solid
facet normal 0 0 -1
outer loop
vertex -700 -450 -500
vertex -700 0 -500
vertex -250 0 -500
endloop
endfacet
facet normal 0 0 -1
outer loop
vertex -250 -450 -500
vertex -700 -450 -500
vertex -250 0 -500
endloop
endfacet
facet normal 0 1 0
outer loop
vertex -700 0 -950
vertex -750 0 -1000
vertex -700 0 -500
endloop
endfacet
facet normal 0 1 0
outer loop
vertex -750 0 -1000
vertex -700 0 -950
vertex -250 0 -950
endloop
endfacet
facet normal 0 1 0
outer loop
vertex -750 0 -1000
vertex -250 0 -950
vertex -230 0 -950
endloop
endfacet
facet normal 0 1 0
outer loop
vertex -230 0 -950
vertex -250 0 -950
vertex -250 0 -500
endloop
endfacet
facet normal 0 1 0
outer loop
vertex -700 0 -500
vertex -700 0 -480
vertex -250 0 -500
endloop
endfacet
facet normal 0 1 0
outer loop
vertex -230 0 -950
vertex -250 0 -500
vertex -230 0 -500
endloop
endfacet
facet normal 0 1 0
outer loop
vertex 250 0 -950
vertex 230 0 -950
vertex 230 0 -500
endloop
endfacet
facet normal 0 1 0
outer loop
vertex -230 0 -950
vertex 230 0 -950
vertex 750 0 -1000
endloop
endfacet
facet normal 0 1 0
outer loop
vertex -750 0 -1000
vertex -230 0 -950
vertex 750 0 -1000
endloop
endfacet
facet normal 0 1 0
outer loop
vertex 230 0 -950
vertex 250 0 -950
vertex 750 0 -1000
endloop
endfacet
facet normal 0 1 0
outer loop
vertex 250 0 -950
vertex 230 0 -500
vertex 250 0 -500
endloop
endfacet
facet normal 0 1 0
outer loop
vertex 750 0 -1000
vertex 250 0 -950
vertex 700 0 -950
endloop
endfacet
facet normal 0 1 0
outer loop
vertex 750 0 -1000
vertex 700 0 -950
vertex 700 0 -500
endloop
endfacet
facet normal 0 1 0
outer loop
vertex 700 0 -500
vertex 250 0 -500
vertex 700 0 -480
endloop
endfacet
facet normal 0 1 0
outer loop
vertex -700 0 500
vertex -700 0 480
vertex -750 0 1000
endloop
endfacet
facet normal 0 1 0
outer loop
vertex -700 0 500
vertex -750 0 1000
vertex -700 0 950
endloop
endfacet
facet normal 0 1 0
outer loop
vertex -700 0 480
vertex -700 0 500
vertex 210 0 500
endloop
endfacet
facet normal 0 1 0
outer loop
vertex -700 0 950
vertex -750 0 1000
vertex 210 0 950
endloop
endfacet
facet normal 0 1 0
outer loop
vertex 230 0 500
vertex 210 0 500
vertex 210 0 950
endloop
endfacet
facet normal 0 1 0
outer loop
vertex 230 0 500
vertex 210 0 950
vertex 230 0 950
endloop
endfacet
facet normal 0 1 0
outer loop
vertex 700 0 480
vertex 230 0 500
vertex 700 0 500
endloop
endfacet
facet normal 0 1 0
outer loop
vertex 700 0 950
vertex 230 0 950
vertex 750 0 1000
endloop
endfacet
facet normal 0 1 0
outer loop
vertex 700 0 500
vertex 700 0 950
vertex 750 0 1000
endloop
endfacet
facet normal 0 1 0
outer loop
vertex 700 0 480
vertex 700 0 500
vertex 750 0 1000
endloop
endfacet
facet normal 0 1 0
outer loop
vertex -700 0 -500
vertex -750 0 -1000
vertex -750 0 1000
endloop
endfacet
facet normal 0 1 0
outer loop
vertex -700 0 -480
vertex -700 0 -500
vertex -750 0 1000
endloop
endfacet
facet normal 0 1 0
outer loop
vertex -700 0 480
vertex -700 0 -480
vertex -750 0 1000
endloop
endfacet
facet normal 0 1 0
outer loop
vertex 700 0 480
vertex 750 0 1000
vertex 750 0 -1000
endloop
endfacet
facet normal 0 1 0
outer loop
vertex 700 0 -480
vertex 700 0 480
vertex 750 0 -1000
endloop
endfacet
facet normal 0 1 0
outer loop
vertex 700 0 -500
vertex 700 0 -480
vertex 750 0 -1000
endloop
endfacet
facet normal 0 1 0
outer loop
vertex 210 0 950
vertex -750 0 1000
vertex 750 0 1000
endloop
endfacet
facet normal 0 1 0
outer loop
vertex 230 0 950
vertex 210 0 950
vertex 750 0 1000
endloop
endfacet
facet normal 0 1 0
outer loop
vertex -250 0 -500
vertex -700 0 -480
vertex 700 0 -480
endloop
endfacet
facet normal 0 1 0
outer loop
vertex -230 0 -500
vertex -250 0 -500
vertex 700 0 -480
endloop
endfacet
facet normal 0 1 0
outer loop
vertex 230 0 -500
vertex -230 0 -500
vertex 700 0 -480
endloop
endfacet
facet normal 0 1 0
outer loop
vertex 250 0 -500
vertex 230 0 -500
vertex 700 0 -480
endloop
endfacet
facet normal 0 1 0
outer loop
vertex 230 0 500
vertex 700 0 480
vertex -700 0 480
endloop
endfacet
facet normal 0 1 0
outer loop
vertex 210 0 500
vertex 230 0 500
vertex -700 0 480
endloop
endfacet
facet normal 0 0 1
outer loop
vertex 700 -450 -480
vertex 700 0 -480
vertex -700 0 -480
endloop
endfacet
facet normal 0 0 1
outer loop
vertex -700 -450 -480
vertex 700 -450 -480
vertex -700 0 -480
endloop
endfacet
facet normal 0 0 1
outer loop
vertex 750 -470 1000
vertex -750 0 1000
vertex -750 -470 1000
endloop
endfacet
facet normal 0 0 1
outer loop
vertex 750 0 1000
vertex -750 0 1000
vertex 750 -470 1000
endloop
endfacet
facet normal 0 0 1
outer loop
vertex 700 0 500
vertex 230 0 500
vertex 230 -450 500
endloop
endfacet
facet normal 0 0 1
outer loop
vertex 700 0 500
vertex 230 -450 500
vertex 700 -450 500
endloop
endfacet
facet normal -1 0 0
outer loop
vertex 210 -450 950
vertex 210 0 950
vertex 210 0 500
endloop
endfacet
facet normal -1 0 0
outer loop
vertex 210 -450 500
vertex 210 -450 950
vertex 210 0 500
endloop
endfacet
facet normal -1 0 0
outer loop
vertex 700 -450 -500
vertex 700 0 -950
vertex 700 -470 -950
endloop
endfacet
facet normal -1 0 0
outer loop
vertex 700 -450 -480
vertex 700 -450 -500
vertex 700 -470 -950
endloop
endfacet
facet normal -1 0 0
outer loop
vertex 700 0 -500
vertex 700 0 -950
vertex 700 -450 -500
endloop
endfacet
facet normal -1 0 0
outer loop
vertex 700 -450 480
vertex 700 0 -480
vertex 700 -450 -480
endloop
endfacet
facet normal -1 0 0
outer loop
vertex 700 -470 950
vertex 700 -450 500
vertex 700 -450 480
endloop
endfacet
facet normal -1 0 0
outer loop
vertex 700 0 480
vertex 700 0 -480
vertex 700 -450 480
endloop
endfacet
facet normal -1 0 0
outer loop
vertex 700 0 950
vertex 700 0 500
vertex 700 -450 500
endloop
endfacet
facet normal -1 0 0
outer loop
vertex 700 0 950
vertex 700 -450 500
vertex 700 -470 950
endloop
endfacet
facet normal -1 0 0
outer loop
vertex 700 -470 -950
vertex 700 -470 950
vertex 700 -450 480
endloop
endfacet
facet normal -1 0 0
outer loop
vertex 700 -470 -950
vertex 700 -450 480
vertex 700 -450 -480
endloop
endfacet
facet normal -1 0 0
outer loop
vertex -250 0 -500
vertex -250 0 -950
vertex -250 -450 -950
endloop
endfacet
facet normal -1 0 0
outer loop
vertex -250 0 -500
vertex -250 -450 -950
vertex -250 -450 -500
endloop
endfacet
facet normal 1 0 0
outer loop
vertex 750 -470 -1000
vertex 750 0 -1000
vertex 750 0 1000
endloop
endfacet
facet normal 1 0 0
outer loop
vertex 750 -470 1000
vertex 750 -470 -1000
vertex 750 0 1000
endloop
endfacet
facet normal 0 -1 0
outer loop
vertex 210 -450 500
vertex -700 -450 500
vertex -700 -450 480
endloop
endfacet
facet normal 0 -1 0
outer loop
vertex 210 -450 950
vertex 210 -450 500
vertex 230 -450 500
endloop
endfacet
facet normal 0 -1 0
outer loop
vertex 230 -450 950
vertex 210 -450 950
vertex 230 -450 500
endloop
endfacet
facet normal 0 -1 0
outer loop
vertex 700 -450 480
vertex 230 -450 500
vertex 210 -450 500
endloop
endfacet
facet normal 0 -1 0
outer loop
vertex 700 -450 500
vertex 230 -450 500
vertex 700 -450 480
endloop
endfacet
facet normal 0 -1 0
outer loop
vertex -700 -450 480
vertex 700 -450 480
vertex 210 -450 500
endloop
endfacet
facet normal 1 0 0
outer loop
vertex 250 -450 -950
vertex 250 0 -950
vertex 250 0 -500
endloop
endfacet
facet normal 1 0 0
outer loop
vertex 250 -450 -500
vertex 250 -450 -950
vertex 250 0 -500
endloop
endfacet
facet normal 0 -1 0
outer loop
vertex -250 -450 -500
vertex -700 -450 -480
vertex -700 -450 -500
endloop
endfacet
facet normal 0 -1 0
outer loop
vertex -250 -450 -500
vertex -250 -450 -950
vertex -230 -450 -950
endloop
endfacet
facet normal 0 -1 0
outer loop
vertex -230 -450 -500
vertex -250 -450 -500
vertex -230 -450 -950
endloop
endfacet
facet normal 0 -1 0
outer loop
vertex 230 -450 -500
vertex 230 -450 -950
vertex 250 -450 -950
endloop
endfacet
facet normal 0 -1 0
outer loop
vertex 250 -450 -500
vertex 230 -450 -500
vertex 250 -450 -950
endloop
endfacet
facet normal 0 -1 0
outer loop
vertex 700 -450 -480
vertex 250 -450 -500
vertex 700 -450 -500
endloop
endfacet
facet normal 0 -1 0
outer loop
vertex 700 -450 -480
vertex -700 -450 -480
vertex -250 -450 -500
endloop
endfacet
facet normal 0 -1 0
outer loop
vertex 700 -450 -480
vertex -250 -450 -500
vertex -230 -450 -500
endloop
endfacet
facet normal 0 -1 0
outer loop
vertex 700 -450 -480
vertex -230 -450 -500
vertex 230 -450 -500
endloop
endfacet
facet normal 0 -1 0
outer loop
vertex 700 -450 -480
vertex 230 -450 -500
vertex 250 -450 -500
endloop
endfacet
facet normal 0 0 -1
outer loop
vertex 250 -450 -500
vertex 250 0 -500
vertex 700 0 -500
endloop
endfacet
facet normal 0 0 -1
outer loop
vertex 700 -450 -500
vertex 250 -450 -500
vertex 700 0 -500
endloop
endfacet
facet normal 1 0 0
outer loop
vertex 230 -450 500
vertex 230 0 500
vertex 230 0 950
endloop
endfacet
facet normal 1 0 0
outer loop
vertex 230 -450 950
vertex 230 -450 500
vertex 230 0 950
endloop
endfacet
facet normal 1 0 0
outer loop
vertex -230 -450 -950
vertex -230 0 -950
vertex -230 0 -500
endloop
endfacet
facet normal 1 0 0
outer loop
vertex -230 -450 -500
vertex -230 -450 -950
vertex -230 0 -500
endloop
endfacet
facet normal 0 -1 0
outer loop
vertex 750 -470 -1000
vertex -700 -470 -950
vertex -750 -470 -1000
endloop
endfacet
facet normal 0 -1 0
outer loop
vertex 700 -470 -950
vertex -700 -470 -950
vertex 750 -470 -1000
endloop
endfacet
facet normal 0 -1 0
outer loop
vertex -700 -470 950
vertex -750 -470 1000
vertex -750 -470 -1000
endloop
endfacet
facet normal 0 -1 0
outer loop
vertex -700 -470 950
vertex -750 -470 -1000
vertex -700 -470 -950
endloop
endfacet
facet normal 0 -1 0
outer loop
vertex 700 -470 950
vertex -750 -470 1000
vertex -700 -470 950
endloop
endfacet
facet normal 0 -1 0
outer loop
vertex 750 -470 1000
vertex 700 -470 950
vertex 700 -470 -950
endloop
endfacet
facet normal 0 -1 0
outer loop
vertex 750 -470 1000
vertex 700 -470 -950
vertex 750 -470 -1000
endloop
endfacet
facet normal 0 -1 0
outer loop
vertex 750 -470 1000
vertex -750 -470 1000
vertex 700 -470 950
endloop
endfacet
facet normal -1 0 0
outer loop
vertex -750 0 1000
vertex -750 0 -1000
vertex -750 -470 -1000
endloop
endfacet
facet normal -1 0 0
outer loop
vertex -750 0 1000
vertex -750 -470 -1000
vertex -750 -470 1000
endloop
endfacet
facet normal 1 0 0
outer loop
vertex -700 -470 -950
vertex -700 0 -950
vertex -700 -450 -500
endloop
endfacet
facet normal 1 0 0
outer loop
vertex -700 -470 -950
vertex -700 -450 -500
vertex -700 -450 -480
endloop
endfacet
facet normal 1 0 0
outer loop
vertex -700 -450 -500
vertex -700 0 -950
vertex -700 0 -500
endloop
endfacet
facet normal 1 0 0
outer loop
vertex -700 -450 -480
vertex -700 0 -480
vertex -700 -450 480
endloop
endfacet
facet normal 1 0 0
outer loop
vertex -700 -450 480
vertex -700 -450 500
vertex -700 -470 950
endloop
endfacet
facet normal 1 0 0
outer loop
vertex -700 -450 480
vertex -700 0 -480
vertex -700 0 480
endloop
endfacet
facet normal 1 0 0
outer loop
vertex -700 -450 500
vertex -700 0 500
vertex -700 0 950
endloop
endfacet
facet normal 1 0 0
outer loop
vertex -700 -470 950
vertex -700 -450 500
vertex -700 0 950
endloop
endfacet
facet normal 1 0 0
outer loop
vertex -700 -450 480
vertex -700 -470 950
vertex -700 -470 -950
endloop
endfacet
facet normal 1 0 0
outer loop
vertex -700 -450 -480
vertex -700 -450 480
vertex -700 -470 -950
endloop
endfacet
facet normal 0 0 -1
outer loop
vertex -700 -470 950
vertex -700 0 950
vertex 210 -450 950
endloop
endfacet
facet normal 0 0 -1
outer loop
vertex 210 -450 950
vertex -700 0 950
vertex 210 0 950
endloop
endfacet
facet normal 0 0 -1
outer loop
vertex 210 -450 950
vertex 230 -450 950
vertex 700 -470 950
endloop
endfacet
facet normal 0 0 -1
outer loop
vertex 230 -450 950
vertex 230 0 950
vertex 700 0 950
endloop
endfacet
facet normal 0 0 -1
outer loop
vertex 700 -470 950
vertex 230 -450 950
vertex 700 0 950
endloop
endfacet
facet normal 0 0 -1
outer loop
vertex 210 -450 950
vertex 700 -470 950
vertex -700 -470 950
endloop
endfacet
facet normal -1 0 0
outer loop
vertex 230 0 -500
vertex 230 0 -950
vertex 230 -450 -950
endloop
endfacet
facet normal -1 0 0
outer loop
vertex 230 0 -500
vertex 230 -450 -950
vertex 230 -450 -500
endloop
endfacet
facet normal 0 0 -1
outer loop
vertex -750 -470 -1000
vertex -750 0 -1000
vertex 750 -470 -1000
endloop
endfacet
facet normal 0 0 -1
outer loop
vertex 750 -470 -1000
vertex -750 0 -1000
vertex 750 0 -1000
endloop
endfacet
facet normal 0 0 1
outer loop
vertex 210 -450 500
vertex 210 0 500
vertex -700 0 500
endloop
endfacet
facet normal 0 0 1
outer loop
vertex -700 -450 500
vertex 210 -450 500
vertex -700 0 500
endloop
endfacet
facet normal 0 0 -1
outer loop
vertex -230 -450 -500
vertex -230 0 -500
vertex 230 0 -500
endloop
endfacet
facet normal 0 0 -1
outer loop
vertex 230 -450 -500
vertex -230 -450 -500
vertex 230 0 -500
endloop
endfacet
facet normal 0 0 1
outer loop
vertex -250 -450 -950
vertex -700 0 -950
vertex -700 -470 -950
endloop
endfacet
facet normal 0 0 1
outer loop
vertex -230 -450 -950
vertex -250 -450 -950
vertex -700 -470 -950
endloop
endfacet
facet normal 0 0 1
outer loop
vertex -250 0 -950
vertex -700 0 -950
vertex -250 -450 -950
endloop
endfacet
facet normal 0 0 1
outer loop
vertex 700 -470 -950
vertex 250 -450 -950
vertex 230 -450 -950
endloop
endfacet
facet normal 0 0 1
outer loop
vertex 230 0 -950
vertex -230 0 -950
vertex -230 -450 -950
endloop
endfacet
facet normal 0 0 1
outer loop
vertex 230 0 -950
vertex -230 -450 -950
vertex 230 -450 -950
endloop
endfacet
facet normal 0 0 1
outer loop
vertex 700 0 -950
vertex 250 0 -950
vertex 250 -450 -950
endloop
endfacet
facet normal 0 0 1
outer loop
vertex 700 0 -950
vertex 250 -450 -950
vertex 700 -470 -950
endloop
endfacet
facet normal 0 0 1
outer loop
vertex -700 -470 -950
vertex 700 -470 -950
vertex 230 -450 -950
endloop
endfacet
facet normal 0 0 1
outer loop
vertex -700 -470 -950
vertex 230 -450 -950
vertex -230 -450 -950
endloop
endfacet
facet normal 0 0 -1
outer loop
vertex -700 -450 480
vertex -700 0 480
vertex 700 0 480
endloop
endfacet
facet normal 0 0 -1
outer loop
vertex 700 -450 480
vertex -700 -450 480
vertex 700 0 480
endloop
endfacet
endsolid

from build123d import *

# Parameters (mm, degrees)
F0_W     = 1500
F0_H     = 2000
F0_W_2   = 1400
F0_H_2   = 1900
F1_DEPTH = 470
F2_W     = 20
F2_H     = 450
F3_DEPTH = 450
F5_DEPTH = 450
F6_W     = 470
F6_H     = 20
F7_DEPTH = 450


with BuildPart() as f1:
    # F0 (on Front) → F1 (new body)
    with BuildSketch(Plane.XZ):
        Rectangle(F0_W, F0_H)
        Rectangle(F0_W_2, F0_H_2, mode=Mode.SUBTRACT)
    extrude(amount=F1_DEPTH)

    # F2 (on Front) → F3 (join)
    with BuildSketch(Plane.XZ):
        Polygon((700, -500), (700, -480), (-700, -480), (-700, -500), (-250, -500), (-230, -500), (230, -500), (250, -500), align=None)
        with Locations((240, -725)):
            Rectangle(F2_W, F2_H)
        with Locations((-240, -725)):
            Rectangle(F2_W, F2_H)
    extrude(amount=F3_DEPTH)

    # F4 (on Front) → F5 (join)
    with BuildSketch(Plane.XZ):
        Polygon((230, 950), (210, 950), (210, 500), (-700, 500), (-700, 480), (230, 480), align=None)
    extrude(amount=F5_DEPTH)

    # F6 (on Front) → F7 (join)
    with BuildSketch(Plane.XZ):
        with Locations((465, 490)):
            Rectangle(F6_W, F6_H)
    extrude(amount=F7_DEPTH)


solid = f1.part
